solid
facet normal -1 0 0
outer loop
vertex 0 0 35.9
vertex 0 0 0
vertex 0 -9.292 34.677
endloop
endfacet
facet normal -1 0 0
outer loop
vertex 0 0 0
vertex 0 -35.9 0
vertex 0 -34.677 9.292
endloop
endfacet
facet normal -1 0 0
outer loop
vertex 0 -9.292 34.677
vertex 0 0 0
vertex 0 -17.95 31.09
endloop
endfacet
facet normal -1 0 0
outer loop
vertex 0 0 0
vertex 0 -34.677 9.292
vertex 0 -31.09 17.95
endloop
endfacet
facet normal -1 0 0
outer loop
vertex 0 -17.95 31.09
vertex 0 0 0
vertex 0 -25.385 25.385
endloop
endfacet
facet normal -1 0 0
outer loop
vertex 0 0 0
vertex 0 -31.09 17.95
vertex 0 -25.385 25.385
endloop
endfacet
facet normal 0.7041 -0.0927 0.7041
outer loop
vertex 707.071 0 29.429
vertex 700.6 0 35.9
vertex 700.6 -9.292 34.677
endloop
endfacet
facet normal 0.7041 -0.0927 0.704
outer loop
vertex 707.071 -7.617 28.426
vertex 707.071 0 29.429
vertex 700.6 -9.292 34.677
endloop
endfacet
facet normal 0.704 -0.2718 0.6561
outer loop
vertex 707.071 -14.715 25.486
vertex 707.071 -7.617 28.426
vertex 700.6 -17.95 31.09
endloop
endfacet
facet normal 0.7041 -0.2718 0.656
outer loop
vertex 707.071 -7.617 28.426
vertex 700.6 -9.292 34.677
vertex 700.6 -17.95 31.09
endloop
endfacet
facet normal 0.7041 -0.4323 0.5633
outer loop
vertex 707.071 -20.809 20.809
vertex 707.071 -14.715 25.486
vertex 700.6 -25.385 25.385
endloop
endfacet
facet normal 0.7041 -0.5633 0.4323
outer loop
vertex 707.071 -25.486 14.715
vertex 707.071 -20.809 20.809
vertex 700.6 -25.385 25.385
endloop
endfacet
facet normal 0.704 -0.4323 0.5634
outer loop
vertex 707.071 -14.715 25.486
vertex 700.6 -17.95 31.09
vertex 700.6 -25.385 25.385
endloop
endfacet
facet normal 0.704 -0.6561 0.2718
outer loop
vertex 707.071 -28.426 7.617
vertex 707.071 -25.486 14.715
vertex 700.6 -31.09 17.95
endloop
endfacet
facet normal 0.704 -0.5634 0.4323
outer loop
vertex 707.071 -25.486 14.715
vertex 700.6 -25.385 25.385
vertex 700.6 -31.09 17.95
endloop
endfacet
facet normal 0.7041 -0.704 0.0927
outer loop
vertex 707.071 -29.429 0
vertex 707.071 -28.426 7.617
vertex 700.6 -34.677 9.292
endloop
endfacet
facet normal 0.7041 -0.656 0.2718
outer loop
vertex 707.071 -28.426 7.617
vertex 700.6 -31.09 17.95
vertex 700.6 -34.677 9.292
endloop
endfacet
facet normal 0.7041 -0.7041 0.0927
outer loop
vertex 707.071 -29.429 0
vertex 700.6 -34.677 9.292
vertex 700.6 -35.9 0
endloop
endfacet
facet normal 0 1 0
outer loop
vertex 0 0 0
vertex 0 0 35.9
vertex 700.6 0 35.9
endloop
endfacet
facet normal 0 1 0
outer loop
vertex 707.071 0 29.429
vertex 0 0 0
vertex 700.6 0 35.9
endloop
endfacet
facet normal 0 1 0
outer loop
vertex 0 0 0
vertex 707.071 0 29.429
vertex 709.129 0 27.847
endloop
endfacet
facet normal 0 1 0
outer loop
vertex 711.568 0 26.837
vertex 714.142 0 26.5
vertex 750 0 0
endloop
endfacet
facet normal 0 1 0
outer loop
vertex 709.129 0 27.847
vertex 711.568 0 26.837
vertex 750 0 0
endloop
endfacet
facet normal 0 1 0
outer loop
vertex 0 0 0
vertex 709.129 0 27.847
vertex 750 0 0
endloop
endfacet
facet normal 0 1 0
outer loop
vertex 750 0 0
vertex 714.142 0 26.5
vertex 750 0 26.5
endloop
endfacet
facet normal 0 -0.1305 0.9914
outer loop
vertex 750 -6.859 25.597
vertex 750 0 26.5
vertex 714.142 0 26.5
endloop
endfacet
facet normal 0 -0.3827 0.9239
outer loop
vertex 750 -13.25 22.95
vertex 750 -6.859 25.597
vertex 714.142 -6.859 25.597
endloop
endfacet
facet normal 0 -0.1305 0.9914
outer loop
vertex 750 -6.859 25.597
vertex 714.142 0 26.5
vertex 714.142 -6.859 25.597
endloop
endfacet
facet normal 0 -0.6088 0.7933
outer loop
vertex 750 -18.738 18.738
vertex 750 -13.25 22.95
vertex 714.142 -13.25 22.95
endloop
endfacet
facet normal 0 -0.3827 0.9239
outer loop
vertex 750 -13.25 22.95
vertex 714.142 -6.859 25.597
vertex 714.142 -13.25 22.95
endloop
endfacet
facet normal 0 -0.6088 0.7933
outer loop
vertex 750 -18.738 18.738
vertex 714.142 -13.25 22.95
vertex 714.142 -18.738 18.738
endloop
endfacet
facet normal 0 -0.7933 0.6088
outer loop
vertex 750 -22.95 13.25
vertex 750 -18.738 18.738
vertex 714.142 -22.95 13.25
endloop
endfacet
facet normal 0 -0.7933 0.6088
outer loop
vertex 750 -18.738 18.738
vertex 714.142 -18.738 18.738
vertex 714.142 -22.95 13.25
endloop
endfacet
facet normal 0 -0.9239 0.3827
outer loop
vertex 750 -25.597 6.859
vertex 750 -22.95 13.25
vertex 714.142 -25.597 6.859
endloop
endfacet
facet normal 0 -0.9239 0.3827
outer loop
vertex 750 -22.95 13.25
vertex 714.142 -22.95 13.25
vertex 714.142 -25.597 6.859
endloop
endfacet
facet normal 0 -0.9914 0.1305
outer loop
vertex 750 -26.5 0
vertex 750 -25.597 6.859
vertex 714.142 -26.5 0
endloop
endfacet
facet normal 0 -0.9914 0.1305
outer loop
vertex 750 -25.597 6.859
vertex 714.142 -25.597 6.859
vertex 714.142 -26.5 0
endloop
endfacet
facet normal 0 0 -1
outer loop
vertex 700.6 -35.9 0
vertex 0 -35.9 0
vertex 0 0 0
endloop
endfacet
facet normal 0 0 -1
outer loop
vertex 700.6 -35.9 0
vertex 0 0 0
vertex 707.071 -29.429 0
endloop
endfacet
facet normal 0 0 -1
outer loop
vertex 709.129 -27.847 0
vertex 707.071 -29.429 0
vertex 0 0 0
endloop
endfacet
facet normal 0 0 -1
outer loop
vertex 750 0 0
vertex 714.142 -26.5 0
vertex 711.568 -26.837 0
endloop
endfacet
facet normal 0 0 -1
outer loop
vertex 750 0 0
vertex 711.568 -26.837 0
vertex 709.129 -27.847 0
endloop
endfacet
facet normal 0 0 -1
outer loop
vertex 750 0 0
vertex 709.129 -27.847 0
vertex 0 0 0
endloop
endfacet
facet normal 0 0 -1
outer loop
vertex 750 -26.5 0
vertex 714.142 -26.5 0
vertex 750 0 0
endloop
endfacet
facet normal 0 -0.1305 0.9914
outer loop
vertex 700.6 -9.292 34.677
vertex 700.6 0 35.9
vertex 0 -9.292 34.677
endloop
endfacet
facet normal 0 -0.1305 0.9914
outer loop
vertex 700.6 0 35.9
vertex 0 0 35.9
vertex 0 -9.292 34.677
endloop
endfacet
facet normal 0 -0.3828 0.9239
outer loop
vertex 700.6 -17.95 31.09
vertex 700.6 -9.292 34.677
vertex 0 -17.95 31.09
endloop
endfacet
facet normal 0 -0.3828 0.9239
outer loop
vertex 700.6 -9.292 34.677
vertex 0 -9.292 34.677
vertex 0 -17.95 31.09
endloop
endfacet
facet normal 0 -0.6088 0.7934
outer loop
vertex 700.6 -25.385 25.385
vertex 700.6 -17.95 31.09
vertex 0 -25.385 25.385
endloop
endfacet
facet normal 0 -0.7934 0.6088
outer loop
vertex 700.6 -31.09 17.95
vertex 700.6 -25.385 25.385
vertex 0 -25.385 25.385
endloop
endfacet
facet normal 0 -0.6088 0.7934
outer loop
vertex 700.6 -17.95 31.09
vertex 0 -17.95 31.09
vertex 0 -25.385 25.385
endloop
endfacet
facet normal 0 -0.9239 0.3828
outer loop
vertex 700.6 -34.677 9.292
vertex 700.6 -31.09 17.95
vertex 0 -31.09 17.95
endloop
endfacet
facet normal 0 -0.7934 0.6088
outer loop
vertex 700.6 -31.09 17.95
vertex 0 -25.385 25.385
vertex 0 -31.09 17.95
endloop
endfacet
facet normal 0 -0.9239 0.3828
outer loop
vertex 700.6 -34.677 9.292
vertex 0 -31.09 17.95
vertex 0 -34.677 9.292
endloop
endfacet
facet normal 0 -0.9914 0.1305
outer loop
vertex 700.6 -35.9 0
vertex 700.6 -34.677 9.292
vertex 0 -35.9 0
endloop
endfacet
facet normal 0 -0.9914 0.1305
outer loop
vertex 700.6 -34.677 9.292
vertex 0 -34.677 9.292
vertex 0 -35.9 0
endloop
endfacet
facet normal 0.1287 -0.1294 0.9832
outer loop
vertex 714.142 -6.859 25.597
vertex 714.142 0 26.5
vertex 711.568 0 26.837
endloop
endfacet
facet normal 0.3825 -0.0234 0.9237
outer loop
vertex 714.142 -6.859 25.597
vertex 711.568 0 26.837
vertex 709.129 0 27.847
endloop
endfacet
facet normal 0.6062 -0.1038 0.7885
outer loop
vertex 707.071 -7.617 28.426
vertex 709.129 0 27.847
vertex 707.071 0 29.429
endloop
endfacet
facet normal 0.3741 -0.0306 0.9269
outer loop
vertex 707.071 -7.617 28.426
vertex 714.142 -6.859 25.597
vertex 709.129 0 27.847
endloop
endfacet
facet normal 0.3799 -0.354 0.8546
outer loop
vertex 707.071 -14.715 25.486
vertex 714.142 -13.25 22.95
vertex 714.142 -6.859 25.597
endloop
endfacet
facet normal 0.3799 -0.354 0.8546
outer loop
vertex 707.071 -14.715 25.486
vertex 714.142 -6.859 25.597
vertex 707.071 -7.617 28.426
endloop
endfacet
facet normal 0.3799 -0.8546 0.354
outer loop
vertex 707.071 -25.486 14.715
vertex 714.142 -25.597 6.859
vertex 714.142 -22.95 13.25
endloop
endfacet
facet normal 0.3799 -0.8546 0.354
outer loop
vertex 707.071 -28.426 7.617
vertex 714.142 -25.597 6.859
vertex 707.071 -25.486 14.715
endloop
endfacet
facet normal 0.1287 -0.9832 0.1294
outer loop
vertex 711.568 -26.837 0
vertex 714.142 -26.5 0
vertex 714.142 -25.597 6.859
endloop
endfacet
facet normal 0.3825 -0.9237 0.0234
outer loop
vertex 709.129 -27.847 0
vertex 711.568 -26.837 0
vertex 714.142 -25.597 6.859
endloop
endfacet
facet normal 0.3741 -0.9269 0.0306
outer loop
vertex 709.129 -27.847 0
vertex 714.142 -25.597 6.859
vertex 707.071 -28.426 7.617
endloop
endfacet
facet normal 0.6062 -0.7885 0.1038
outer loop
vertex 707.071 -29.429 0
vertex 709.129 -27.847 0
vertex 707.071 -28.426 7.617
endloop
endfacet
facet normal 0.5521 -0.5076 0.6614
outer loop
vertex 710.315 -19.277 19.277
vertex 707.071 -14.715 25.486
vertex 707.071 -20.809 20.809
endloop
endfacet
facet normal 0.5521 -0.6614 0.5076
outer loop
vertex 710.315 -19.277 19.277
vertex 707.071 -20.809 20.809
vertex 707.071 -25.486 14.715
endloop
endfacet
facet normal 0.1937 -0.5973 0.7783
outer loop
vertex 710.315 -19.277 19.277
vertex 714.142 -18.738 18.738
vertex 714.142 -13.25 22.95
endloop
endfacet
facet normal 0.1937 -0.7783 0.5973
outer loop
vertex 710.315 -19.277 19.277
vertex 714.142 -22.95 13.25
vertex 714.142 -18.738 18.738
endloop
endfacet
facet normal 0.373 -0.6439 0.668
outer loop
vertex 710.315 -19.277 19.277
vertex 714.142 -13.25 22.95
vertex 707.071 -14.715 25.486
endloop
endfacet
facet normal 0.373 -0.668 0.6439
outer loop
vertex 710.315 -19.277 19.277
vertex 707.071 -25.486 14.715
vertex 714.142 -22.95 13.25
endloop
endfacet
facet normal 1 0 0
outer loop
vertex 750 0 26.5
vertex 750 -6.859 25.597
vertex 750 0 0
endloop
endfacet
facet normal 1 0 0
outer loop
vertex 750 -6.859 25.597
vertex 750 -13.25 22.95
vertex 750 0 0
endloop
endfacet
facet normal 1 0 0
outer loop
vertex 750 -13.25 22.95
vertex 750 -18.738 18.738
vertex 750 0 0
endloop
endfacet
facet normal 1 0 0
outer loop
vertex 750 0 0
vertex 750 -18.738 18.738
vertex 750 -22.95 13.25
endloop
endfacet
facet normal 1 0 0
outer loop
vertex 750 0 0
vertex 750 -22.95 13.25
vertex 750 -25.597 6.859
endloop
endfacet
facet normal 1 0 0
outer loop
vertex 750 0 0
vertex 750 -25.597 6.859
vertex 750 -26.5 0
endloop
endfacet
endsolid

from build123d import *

# Parameters (mm, degrees)
F1_ANGLE = 90
F2_R     = 10


with BuildPart() as f1:
    # F0 (on Front) → F1 (revolve)
    with BuildSketch(Plane.XZ):
        Polygon((700.6, 35.9), (0, 35.9), (0, 24.079584), (0, 0), (750, 0), (750, 26.5), (710, 26.5), align=None)
    revolve(axis=Axis((375, 0, 0), (1, 0, 0)), revolution_arc=F1_ANGLE)

    # F2
    f2_edges = [f1.edges().sort_by_distance(p)[0] for p in [
        (710, -18.73833, 18.73833),
    ]]
    fillet(f2_edges, radius=F2_R)


solid = f1.part
